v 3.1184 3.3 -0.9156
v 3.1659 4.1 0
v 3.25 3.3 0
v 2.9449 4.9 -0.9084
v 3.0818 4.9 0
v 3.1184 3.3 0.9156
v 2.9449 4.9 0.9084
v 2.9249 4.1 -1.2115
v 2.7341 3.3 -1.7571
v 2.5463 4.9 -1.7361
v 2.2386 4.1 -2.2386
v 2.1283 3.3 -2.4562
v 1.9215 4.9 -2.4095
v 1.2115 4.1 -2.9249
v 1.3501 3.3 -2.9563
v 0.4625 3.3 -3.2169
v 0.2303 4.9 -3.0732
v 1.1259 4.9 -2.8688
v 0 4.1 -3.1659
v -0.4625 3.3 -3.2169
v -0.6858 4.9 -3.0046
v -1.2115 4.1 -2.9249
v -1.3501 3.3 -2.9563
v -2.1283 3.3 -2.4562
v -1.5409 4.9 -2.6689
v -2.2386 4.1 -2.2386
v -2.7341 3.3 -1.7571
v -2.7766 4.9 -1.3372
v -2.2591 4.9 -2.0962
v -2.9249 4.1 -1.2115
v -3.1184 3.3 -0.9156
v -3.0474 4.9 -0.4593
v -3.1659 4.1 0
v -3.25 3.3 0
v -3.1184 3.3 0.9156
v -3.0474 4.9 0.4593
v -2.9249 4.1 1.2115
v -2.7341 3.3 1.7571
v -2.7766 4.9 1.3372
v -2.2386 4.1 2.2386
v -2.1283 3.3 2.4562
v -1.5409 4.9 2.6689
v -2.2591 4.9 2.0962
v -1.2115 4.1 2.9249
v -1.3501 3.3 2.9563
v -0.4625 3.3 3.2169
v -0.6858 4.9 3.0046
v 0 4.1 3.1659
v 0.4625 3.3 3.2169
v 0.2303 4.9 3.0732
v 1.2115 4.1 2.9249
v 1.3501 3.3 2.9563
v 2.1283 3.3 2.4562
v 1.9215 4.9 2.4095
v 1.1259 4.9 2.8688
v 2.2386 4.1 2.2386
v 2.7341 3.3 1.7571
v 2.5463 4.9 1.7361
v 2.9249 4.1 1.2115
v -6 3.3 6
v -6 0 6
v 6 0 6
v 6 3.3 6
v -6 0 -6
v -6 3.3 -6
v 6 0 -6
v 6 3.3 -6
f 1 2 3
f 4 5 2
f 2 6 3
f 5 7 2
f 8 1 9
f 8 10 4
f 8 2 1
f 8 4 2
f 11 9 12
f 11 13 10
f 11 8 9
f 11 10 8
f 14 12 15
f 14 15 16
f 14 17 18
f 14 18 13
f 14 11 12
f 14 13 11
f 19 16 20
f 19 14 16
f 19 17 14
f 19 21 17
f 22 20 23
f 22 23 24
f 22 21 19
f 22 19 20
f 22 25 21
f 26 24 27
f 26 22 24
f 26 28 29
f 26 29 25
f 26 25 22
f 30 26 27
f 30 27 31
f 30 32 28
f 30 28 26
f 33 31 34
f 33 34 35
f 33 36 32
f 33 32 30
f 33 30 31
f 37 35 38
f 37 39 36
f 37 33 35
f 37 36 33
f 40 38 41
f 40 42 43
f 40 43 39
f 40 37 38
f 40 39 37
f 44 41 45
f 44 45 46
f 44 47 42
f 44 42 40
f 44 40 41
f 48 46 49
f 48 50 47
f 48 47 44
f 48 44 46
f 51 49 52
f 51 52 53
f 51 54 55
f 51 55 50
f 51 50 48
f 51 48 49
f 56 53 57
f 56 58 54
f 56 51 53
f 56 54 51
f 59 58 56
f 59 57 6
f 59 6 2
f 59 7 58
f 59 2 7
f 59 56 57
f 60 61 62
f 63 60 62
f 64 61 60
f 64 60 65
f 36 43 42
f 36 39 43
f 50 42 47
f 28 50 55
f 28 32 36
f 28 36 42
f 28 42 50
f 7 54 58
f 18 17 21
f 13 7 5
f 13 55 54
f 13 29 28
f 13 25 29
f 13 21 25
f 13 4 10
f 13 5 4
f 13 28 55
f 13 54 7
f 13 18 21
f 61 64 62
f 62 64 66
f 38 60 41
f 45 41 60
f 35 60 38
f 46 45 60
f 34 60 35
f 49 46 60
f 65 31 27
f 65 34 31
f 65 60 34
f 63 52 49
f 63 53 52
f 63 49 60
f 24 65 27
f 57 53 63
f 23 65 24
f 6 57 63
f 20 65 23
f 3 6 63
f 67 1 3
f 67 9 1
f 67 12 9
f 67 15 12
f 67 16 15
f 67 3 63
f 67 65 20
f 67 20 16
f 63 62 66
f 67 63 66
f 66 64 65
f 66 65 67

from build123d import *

# Parameters (mm, degrees)
SKETCH1_W           = 12
SKETCH1_H           = 12
BOSS_EXTRUDE1_DEPTH = 3.3
SKETCH2_R           = 3.25
BOSS_EXTRUDE2_DEPTH = 1.6
BOSS_EXTRUDE2_TAPER = 6


with BuildPart() as part:
    # Sketch1 → Boss-Extrude1 (new body)
    with BuildSketch(Plane(origin=(0, 0, 0), x_dir=(1, 0, 0), z_dir=(0, 1, 0))):
        Rectangle(SKETCH1_W, SKETCH1_H)
    extrude(amount=BOSS_EXTRUDE1_DEPTH)

    # Sketch2 → Boss-Extrude2 (add)
    with BuildSketch(Plane(origin=(0, 3.3, 0), x_dir=(1, 0, 0), z_dir=(0, 1, 0))):
        Circle(SKETCH2_R)
    extrude(amount=BOSS_EXTRUDE2_DEPTH, taper=BOSS_EXTRUDE2_TAPER)


solid = part.part
